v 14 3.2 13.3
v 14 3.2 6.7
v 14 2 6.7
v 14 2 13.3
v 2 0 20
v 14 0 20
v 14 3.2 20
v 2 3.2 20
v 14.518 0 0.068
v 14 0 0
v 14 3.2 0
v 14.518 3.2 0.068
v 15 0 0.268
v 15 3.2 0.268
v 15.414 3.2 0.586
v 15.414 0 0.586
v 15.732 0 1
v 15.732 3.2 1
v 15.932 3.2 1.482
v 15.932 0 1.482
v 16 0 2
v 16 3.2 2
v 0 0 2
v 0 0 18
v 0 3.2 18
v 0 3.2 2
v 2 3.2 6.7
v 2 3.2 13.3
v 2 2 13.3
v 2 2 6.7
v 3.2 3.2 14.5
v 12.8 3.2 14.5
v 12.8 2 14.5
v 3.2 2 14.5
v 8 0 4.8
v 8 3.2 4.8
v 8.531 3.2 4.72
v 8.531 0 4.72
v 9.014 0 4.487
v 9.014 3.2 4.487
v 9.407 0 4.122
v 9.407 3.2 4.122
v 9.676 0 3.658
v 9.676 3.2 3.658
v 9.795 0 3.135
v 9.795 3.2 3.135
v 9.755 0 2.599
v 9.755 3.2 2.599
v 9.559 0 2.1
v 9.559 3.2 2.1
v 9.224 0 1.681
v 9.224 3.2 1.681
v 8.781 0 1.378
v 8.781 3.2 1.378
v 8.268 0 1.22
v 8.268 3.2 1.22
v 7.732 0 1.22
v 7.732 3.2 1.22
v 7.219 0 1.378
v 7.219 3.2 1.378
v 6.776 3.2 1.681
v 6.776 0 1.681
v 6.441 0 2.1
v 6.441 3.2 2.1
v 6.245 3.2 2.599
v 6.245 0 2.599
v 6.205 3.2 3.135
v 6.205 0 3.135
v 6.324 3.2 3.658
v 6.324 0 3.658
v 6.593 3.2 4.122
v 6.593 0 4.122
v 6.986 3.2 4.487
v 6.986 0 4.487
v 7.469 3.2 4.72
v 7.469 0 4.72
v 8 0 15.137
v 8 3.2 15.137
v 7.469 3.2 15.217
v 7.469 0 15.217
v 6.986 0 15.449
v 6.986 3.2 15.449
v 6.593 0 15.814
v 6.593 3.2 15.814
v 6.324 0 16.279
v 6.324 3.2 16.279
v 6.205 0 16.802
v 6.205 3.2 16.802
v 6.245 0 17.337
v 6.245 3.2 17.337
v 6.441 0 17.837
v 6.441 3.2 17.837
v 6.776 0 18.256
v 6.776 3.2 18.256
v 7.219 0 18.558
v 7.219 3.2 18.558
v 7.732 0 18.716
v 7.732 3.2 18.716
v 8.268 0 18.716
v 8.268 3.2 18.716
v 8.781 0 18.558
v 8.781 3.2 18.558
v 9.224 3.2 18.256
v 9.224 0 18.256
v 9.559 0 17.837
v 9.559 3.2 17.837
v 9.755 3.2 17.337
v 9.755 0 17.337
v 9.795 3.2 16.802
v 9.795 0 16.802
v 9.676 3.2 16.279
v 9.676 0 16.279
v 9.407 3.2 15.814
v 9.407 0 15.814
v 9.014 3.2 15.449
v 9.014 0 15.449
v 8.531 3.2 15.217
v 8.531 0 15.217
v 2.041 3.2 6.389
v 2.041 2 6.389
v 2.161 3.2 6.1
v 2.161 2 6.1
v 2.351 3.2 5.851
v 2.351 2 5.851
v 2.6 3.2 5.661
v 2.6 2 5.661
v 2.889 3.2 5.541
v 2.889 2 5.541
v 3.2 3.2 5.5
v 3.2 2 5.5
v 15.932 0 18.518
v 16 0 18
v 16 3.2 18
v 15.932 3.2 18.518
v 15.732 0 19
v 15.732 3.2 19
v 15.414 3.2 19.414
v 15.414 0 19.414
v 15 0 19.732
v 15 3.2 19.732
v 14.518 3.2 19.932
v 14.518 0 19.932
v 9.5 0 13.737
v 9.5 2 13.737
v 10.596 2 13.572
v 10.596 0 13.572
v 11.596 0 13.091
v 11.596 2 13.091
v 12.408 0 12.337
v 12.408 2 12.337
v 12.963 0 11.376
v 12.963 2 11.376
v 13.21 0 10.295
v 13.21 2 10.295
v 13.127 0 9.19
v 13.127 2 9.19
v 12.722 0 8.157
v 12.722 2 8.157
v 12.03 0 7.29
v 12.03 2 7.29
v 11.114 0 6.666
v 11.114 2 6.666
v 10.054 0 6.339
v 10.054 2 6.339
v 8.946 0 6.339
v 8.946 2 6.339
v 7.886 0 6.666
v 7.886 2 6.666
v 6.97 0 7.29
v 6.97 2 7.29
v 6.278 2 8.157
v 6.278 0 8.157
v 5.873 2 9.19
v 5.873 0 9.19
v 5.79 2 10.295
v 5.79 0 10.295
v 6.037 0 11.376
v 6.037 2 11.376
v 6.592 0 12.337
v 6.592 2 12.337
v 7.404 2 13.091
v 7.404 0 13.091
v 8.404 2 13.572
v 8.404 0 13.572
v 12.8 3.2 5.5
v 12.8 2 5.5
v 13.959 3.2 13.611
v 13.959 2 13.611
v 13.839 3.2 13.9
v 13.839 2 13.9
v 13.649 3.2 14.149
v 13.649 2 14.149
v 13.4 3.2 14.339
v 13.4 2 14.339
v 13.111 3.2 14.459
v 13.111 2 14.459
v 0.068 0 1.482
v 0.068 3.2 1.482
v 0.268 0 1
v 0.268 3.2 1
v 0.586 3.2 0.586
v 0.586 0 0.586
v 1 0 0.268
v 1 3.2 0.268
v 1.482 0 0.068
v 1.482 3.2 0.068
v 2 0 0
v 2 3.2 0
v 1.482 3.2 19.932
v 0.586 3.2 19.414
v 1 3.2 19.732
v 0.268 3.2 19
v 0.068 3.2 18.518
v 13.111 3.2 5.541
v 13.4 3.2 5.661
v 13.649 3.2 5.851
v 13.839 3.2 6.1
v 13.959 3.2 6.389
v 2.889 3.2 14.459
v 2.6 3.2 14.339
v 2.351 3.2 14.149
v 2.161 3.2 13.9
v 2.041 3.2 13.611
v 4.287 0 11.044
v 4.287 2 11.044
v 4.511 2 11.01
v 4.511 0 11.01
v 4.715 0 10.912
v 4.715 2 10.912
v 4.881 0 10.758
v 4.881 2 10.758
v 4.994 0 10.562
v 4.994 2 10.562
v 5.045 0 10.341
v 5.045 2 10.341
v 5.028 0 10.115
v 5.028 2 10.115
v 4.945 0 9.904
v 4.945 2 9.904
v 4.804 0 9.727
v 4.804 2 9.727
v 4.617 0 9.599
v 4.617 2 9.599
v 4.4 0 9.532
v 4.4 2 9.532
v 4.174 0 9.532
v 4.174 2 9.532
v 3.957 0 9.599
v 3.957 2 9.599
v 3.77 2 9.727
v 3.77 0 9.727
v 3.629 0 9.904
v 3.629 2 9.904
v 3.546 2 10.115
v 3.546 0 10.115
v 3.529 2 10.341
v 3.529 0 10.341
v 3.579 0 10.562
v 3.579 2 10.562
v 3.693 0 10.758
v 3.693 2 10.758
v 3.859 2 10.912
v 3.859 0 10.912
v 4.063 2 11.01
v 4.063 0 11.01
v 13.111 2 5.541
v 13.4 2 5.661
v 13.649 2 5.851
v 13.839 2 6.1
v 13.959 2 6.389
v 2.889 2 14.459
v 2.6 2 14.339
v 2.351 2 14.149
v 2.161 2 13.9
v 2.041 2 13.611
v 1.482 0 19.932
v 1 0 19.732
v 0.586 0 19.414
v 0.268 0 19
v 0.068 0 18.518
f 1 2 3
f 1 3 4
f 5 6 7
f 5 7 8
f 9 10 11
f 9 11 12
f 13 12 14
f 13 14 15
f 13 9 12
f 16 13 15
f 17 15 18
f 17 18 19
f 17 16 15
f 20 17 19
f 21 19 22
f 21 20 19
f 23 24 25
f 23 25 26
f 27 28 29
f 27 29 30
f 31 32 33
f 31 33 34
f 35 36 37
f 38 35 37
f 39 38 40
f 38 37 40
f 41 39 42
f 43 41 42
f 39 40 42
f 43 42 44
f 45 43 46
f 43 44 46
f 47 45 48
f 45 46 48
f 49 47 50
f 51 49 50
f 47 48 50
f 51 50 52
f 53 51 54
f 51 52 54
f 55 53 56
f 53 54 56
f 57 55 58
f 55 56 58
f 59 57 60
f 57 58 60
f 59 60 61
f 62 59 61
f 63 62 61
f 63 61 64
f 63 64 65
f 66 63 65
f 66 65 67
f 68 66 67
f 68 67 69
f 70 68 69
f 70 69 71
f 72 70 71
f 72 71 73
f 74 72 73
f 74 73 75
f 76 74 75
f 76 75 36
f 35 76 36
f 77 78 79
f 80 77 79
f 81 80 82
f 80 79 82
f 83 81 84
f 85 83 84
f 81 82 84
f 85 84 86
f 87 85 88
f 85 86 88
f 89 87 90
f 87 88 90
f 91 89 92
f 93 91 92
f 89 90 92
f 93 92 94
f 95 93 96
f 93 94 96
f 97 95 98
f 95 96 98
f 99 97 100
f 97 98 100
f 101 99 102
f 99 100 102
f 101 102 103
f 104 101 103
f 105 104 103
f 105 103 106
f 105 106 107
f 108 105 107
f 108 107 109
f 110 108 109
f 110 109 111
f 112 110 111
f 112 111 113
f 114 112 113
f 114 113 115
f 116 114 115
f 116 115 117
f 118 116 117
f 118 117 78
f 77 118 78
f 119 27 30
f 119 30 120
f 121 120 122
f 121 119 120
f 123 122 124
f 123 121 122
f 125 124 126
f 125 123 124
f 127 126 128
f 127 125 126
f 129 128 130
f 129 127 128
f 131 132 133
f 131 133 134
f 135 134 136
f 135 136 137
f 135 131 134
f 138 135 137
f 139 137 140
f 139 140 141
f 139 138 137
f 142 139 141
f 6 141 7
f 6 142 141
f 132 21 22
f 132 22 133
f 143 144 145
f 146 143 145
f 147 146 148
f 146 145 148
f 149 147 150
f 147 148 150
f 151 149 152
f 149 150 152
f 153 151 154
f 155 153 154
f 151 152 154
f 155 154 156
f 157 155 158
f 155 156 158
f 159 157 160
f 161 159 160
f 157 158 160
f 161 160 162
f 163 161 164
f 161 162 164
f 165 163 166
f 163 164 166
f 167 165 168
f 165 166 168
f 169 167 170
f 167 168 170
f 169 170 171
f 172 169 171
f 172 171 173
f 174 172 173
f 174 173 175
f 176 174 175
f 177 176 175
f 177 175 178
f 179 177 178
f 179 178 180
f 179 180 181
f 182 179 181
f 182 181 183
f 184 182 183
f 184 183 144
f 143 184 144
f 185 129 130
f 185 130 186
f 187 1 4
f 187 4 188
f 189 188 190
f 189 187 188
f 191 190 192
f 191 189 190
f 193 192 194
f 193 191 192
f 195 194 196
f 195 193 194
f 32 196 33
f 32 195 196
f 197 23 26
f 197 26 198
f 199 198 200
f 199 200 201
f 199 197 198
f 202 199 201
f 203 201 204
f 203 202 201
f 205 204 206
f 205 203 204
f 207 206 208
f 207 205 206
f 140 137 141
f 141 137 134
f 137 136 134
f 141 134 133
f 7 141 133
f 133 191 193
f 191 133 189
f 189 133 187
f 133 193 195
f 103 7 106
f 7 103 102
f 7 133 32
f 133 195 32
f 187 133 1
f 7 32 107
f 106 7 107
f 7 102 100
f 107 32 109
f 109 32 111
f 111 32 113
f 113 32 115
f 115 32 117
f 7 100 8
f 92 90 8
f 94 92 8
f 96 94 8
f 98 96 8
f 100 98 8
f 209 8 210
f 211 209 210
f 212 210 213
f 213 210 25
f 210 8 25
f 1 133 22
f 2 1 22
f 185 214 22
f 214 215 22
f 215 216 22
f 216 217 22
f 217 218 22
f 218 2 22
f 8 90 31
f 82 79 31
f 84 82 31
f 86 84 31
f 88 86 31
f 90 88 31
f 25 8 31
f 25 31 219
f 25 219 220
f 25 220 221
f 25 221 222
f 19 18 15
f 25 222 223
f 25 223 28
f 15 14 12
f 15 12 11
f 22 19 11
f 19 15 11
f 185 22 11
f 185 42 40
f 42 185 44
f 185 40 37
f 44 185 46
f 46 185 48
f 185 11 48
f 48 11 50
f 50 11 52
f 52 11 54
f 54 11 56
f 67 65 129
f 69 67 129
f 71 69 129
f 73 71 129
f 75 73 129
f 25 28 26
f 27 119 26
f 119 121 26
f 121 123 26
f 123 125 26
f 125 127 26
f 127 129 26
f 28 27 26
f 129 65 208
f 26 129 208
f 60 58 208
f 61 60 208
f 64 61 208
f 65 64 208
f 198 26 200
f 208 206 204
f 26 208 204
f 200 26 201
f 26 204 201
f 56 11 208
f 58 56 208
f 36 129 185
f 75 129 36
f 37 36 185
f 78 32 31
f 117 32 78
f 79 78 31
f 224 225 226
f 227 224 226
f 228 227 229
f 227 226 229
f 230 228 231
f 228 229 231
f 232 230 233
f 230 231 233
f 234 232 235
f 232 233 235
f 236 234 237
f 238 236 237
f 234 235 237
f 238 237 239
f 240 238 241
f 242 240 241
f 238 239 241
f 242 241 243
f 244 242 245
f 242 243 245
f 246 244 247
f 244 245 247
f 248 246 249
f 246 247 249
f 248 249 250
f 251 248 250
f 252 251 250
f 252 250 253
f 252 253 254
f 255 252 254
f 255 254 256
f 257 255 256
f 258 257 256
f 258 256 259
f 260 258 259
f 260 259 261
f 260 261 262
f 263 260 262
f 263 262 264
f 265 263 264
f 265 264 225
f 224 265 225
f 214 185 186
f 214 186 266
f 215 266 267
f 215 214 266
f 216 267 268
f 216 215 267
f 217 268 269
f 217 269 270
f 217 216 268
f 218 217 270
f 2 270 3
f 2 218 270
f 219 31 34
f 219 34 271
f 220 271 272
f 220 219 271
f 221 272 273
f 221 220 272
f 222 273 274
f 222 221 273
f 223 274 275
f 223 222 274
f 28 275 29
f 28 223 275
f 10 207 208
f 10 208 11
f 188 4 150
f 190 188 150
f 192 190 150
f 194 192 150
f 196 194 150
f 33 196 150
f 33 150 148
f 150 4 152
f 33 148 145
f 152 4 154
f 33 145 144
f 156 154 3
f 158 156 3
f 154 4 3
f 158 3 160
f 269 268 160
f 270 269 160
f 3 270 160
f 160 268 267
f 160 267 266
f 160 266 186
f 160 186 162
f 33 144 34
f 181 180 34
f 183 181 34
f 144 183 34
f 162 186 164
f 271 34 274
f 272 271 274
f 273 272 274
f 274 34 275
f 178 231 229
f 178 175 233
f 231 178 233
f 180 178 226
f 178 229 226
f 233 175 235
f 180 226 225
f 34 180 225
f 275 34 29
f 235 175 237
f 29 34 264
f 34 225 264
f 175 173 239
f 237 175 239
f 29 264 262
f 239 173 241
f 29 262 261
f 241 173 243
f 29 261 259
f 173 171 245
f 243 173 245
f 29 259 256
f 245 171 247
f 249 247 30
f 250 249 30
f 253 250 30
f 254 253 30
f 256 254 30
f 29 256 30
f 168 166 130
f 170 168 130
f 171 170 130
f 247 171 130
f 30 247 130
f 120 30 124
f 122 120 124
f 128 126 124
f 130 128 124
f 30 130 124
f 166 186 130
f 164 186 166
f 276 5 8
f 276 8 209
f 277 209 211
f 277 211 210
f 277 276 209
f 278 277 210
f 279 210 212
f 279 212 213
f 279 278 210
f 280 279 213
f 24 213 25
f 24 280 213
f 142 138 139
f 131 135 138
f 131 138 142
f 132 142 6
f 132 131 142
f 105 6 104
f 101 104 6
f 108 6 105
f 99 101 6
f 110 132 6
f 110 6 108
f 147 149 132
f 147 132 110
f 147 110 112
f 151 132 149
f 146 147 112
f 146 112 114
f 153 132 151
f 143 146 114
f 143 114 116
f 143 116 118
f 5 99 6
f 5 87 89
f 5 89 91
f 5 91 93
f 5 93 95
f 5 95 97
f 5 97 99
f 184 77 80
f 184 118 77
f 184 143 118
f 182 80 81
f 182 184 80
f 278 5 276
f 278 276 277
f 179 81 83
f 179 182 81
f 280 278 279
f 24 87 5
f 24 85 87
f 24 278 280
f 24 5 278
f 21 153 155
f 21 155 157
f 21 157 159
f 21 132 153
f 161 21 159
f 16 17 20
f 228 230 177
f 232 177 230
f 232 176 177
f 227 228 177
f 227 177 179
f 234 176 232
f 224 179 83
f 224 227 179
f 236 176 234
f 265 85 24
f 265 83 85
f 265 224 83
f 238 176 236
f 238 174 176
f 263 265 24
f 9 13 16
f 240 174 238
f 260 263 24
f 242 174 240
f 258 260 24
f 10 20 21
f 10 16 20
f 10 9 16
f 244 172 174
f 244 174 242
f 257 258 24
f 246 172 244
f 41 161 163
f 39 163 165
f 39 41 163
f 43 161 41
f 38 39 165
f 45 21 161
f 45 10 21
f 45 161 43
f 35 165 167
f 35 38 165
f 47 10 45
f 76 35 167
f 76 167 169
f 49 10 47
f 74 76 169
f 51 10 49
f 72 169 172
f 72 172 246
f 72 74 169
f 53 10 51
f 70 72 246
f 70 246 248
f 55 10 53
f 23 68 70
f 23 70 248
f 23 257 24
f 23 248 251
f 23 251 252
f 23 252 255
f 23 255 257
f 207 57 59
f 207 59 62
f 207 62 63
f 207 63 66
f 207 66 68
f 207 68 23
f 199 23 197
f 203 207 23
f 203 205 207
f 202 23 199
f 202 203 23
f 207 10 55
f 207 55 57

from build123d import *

# Parameters (mm, degrees)
BOSS_EXTRUDE1_DEPTH = 3.2
CUT_EXTRUDE1_DEPTH  = 1.2
SKETCH3_R           = 3.72
CUT_EXTRUDE2_DEPTH  = 26.690465157
SKETCH4_R           = 1.8
CUT_EXTRUDE3_DEPTH  = 26.811625288
SKETCH5_R           = 0.76
CUT_EXTRUDE4_DEPTH  = 10


with BuildPart() as part:
    # Sketch1 → Boss-Extrude1 (new body)
    with BuildSketch(Plane(origin=(0, 0, 0), x_dir=(1, 0, 0), z_dir=(0, 1, 0))):
        with BuildLine():
            Line((2, 0), (14, 0))
            ThreePointArc((14, 0), (15.414213562, -0.585786438), (16, -2))
            Line((16, -2), (16, -18))
            ThreePointArc((16, -18), (15.414213562, -19.414213562), (14, -20))
            Line((14, -20), (2, -20))
            ThreePointArc((2, -20), (0.585786438, -19.414213562), (0, -18))
            Line((0, -18), (0, -2))
            ThreePointArc((0, -2), (0.585786438, -0.585786438), (2, 0))
        make_face()
    extrude(amount=BOSS_EXTRUDE1_DEPTH)

    # Sketch2 → Cut-Extrude1 (cut)
    with BuildSketch(Plane(origin=(0, 3.2, 0), x_dir=(1, 0, 0), z_dir=(0, 1, 0))):
        with BuildLine():
            Line((3.2, -5.5), (12.8, -5.5))
            ThreePointArc((12.8, -5.5), (13.648528137, -5.851471863), (14, -6.7))
            Line((14, -6.7), (14, -13.3))
            ThreePointArc((14, -13.3), (13.648528137, -14.148528137), (12.8, -14.5))
            Line((12.8, -14.5), (3.2, -14.5))
            ThreePointArc((3.2, -14.5), (2.351471863, -14.148528137), (2, -13.3))
            Line((2, -13.3), (2, -6.7))
            ThreePointArc((2, -6.7), (2.351471863, -5.851471863), (3.2, -5.5))
        make_face()
    extrude(amount=-CUT_EXTRUDE1_DEPTH, mode=Mode.SUBTRACT)

    # Sketch3 → Cut-Extrude2 (cut, through all)
    with BuildSketch(Plane(origin=(0, 2, 0), x_dir=(1, 0, 0), z_dir=(0, 1, 0))):
        with Locations(Location((9.5, -10.0173545, 0), (0, 0, 270))):
            Circle(SKETCH3_R)
    extrude(amount=-CUT_EXTRUDE2_DEPTH, mode=Mode.SUBTRACT)

    # Sketch4 → Cut-Extrude3 (cut, through all)
    with BuildSketch(Plane(origin=(0, 3.2, 0), x_dir=(1, 0, 0), z_dir=(0, 1, 0))):
        with Locations(Location((8, -3, 0), (0, 0, 270))):
            Circle(SKETCH4_R)
        with Locations(Location((8, -16.936566923, 0), (0, 0, 90))):
            Circle(SKETCH4_R)
    extrude(amount=-CUT_EXTRUDE3_DEPTH, mode=Mode.SUBTRACT)

    # Sketch5 → Cut-Extrude4 (cut)
    with BuildSketch(Plane(origin=(0, 2, 0), x_dir=(1, 0, 0), z_dir=(0, 1, 0))):
        with Locations(Location((4.286808808, -10.283883288, 0), (0, 0, 270))):
            Circle(SKETCH5_R)
    extrude(amount=-CUT_EXTRUDE4_DEPTH, mode=Mode.SUBTRACT)


solid = part.part
